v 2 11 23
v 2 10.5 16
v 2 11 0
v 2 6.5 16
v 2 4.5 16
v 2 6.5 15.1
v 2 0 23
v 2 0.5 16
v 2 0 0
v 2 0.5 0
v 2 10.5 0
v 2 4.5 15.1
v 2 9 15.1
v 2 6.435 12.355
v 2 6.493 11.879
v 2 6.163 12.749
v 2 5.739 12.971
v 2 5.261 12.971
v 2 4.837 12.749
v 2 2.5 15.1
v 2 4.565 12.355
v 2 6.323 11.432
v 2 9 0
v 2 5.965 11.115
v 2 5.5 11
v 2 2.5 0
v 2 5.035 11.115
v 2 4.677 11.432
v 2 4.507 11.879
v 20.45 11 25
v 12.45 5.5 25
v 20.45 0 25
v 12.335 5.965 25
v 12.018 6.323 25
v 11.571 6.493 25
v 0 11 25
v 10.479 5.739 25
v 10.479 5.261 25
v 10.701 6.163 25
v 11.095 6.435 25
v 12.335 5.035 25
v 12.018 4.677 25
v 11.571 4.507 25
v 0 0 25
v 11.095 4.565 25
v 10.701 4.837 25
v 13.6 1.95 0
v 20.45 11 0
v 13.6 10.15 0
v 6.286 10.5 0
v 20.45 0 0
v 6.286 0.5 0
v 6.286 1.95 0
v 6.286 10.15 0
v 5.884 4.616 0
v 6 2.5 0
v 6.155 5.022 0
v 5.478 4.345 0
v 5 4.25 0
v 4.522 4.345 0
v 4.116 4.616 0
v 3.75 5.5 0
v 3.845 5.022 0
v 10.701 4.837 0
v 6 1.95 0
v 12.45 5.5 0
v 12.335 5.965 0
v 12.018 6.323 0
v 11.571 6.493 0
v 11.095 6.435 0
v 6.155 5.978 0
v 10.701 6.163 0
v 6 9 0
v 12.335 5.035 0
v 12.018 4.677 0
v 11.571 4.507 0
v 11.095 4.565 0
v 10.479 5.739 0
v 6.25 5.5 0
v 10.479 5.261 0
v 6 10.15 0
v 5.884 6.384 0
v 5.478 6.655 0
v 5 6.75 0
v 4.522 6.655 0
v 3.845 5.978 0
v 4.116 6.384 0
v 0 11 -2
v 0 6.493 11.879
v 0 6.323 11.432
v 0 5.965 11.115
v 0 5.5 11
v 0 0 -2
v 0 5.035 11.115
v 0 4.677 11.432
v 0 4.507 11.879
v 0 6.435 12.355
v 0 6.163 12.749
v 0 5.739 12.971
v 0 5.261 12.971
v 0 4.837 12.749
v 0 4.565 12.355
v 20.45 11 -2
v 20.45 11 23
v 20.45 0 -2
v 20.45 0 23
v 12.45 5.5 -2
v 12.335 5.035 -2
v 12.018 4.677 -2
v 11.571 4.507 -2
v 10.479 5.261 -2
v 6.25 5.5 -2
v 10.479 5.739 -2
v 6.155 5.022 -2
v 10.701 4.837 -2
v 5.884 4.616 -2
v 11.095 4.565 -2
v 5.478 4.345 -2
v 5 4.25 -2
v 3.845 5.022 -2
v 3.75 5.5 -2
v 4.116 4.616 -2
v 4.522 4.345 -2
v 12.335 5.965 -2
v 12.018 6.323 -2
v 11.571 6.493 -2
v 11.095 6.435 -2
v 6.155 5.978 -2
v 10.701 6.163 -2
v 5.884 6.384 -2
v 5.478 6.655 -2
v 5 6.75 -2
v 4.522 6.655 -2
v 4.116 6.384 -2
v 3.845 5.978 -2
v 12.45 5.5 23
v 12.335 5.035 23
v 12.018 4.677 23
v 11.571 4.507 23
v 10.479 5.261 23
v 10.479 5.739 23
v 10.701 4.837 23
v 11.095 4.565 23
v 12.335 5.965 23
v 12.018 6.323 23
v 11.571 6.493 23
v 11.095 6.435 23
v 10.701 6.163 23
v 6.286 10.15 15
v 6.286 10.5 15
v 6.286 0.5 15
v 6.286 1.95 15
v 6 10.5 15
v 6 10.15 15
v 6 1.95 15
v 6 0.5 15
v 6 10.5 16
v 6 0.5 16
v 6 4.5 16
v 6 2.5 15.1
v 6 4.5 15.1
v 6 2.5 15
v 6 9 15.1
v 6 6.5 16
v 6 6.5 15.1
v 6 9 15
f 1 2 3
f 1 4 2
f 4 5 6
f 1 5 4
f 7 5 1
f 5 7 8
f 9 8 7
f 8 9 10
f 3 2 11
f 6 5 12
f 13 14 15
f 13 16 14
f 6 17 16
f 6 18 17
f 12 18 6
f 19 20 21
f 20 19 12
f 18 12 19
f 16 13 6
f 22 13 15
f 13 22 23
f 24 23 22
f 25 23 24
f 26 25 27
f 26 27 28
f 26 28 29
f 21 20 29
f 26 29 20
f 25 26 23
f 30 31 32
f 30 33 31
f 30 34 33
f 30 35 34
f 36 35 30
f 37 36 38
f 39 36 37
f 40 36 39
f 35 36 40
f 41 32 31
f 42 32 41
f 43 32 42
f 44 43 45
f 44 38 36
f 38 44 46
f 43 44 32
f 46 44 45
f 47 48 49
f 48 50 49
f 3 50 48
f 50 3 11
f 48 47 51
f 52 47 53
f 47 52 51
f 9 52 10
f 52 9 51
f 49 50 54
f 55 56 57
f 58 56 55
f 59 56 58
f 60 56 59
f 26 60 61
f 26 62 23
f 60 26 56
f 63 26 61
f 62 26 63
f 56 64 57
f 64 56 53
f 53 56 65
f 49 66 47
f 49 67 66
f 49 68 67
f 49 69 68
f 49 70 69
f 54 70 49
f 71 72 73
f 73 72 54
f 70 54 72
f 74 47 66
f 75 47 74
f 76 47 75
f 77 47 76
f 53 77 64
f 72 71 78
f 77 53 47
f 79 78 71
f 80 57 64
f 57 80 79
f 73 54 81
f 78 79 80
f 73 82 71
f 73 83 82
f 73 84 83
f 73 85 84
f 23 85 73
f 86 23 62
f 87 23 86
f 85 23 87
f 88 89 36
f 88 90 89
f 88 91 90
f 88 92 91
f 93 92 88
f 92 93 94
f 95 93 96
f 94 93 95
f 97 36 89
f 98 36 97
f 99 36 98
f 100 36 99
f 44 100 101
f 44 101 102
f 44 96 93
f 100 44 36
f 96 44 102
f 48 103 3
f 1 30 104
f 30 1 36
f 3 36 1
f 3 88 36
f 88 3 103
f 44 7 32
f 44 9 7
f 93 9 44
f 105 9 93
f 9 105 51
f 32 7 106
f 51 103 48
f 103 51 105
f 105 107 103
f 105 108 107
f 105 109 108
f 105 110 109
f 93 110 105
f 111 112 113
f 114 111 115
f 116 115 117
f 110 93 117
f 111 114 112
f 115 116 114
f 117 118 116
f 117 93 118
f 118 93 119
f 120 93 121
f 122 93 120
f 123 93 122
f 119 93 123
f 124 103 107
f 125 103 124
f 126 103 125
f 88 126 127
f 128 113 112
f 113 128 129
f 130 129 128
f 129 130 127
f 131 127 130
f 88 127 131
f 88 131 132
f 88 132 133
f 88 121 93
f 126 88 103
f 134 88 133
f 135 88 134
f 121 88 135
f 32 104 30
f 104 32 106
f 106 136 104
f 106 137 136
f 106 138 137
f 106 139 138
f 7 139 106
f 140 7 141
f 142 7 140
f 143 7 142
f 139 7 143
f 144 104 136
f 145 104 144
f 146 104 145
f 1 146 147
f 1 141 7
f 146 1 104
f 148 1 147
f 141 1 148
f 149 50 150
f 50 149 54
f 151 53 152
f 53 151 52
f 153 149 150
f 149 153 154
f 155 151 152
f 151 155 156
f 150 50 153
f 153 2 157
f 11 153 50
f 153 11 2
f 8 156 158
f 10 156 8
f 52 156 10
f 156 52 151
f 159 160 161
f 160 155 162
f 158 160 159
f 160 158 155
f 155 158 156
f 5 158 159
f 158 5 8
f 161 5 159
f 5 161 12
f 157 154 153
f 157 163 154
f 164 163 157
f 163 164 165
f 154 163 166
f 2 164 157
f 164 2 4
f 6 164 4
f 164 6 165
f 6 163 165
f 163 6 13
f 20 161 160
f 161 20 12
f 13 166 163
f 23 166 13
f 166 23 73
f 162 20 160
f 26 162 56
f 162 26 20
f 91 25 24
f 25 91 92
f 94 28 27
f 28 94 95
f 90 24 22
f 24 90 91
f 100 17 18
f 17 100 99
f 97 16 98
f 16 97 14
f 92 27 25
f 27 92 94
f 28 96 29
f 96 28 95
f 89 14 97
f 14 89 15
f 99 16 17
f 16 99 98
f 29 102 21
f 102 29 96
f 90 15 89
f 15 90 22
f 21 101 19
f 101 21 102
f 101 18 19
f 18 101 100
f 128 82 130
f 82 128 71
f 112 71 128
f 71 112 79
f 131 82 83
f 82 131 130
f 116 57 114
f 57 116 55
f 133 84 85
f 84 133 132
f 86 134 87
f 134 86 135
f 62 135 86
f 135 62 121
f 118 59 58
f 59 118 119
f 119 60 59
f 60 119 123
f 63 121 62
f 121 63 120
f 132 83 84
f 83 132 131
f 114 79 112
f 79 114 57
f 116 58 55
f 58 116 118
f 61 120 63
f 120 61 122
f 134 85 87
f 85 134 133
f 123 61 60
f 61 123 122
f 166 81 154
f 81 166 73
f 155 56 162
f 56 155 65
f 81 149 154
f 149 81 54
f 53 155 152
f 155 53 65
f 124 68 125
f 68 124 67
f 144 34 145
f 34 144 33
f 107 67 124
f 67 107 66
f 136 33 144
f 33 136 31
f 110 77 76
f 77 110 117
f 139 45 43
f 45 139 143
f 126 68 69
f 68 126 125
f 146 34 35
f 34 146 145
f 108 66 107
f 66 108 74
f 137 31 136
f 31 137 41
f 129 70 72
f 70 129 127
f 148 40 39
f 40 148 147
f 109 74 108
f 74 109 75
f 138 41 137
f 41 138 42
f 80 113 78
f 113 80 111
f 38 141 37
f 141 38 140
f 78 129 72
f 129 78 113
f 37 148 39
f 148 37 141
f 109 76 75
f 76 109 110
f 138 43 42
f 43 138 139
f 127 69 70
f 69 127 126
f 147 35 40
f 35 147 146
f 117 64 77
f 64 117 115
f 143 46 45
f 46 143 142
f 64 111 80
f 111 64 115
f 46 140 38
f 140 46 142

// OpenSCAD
// Dubs "A" class locomotive
//Measurements 1:64 scale in mm
$fs=0.5;
clearance=0.5; //why?
lengthBetweenBuffers=74;
trackGauge=16.5;
frameThickness=1.5;
frameSideHeight=10;
axleDiameter=2.0;
frameOutsideSpacing=14;
frameInsideSpacing=frameOutsideSpacing-frameThickness*2;
echo("frame inside spacing is ",frameInsideSpacing);

bufferPlateHeight=5;
bufferPlateLength=31;

frontAxleFromFrontDistance=20;
rearAxleFromFrontDistance=47;
axleHeight=axleDiameter;
boilerCentreHeight=19;

motorLength= 15;
motorDiameter=6;
motorShaftLength=6;
motorShaftDiameter=2.0;


oringInsideDiameter=7.5;//9.5;

oringThickness=1.7;//oringOutsideDiameter-oringInsideDiameter;
oringOutsideDiameter=oringInsideDiameter+oringThickness*2;
echo("o ring OD",oringOutsideDiameter," ID is",oringInsideDiameter);

pulleyThickness=3.5;
pulleyDiameter=oringInsideDiameter+oringThickness/2*2;
echo("pulley diameter is ",pulleyDiameter);


frictionWheelDiameter=oringOutsideDiameter;
frictionWheelThickness=pulleyThickness;
frictionWheelX=frictionWheelDiameter/2+motorShaftDiameter/2;
echo("friction wheel X position is ",frictionWheelX);


driveShaftDiameter=2.0;


wormGearLength=8;
wormGearDiameter=4.6;

gearDiameter=12;
gearThickness=2;



motorMountThickness=2;
motorMountLength=motorLength+motorShaftLength+motorMountThickness+2;
frameIntersection=9;
motorMountDepth=frameInsideSpacing;
driveShaftLength=motorMountLength+motorMountThickness+1;

wheelRimOutsideDiameter=12;
wheelRimInsideDiameter=10;
wheelFlangeDiameter=15;
wheelNumberSpokes=14;
wheelSpokeThickness=0.8;
wheelTreadThickness=3;
wheelFlangeThickness=1;
wheelHubDiameter=5;
wheelThickness=wheelTreadThickness+wheelFlangeThickness;

frontWheelPosition=[frontAxleFromFrontDistance,0,axleHeight];
rearWheelPosition=[rearAxleFromFrontDistance,0,axleHeight];

boilerLength=55;
boilerDiameter=15;
boilerDistance=5;
basePlateThickness=1;
basePlateLength=lengthBetweenBuffers;
basePlateWidth=31;

module gear() {
    color("white") cylinder(h=gearThickness,d=gearDiameter,center=true);
}

module axle() {
    rotate ([90,0,0])  cylinder(h=60,d=axleDiameter,center=true);
}

module spokes() {
    difference() {
        union() {
    rotate([0,0,0-22.5]) cube([wheelRimInsideDiameter,wheelSpokeThickness,wheelTreadThickness] ,center=true);
    rotate([0,0,45-22.5]) cube([wheelRimInsideDiameter,wheelSpokeThickness,wheelTreadThickness] ,center=true);
    //balances
     for (i=[90:10:135]) { 
        rotate([0,0,i-22.5]) cube([wheelRimInsideDiameter,wheelSpokeThickness,wheelTreadThickness] ,center=true);
        }
    }
    union() {
    //pin hole
    translate([0,wheelRimOutsideDiameter/4,0]) cylinder(h=wheelTreadThickness+0.1,d=1.5 ,center=true);
        //axle hole
                cylinder(h=wheelTreadThickness+0.1 ,d=2 ,center=true);
    
        
    }
}
}

//!spokes();

module wheelRim() {
  difference() {
        cylinder(h=wheelTreadThickness,d=wheelRimOutsideDiameter,center=true );  
      cylinder(h=wheelTreadThickness+0.1,d=wheelRimInsideDiameter,center=true ); 
  }
}

//!wheelRim();

module wheelFlange() {
     difference() {
         cylinder(h=wheelFlangeThickness,d=wheelFlangeDiameter,center=true);
        cylinder(h=wheelTreadThickness+0.1,d=wheelRimInsideDiameter,center=true ); 
     }
}

module wheelHub() {
      difference() {
        cylinder(h=wheelTreadThickness,d=wheelHubDiameter,center=true);
        cylinder(h=wheelTreadThickness+0.1 ,d=2 ,center=true);
    }
}



module wheel() {
    translate([0,0,wheelTreadThickness/2]) wheelRim();
    translate([0,0,wheelFlangeThickness/2]) wheelFlange();
   translate([0,0,wheelTreadThickness/2]) spokes();
     translate([0,0,wheelTreadThickness/2])  wheelHub();
}

//!wheel();



module oring() { 
    color("black") 
    rotate_extrude()
translate([(oringOutsideDiameter-(oringOutsideDiameter-oringInsideDiameter)/2)/2, 0, 0])
circle(d = oringThickness); 
}

//!oring();

module pulley() {
      difference() {
          cylinder(h=pulleyThickness,d=pulleyDiameter); 
         union() {
             //groove
             translate([0,0,pulleyThickness/2]) oring();
             driveShaft();
         }
}
}

//!pulley();


    
module frictionWheel() {
    pulley();
    translate([0,0,pulleyThickness/2])  oring();
}

module wheelAssembly() {
   
            translate([0,-frameOutsideSpacing/2,0])  rotate([90,90,0]) wheel();
            translate([0,(frameOutsideSpacing)/2,0]) rotate([90,90,180])   wheel();
            rotate([90,90,0]) gear();
}

module motor() {
    color("red") cylinder(h=motorLength,d=motorDiameter);
    translate([0,0,motorLength/2+motorShaftLength]) cylinder(h=motorShaftLength,d=motorShaftDiameter);
}

module driveShaft() {
     cylinder(h=driveShaftLength,d=driveShaftDiameter);
}

module wormGear() {
    color("white")  cylinder(h=wormGearLength,d=wormGearDiameter);
}

module motorMount() {
       color("yellow") 
    difference() {
           union() {
    //top
    cube([motorMountThickness,motorMountDepth,motorMountLength]);
    //worm end
    translate([0,0,-motorMountThickness]) cube([frictionWheelX+motorDiameter/2+driveShaftDiameter+frameIntersection,motorMountDepth,motorMountThickness]);
    //friction Wheel end
    translate([0,0,motorMountLength-motorMountThickness]) cube([frictionWheelX+motorDiameter/2+driveShaftDiameter+frameIntersection,motorMountDepth,motorMountThickness]);
    //motor housing
    motorMountMotorHousingDepth=motorDiameter+motorMountThickness*2;
    translate([motorMountThickness,motorMountDepth/2-motorMountMotorHousingDepth/2,0]) cube([motorDiameter/1.4,motorMountMotorHousingDepth,motorLength]);
     //motor housing stops
               translate([0,motorDiameter/2-motorMountThickness-0.5,motorLength]) cube([motorDiameter,motorMountThickness+motorDiameter/3,1]);
                              translate([0,motorMountDepth-motorDiameter/2-motorMountThickness+0.5,motorLength]) cube([motorDiameter,motorMountThickness+motorDiameter/3,1]);
           }
           union() {
              //space for motor body
               translate([motorMountThickness,motorMountDepth/2-motorDiameter/2,0]) cube([motorDiameter+clearance,motorDiameter+clearance,motorLength+0.1]);
               //hole for pressure screww
            translate([-motorMountThickness/2,motorMountDepth/2,motorLength-3]) rotate([0,90,0])  cylinder(h=motorMountThickness+3,d=2.0);
               //hole for motor wires
    translate([motorDiameter-motorMountThickness/2,motorMountDepth/2,-5]) cylinder(h=motorLength,d=2.5);
               //space for inserting motor
               translate([motorDiameter,(motorDiameter-2.1)/2,0]) cube([motorDiameter+1.6,motorDiameter+2.2,motorLength]);
               //drive shaft
                             translate([frictionWheelX+motorDiameter/2+motorMountThickness,motorMountDepth/2,-2]) driveShaft(); 
           }
    }
}

!motorMount();

module motorAssembly() {
   difference() {
       union() {
           translate([frictionWheelX,0,motorLength+motorShaftLength/2-frictionWheelThickness/2]) frictionWheel();

    translate([frictionWheelX,0,wormGearLength/2]) wormGear();
    translate([-motorDiameter/2-motorMountThickness,-motorMountDepth/2,0]) motorMount();
    motor();
       }
       union() {

       }
   }
}

//!motorAssembly();

module frameSideBlock() {
    union() {
        cube([lengthBetweenBuffers,frameThickness,frameSideHeight]);
    }
}

module frameCutout() {
    intersection() {
        translate([frameSideHeight/2,frameThickness-0.1,0]) rotate([90,0,0]) cylinder(h=frameThickness*2+0.2,d=frameSideHeight);
        translate([frameSideHeight/2,-frameThickness-0.1,0]) cube([frameSideHeight/2,frameThickness*2+0.2,frameSideHeight/2]);  
    }
            translate([-4,-frameThickness-0.1,0]) cube([frameSideHeight,frameThickness*2+0.2,frameSideHeight/2]); 
}

frameCutoutLength=frameSideHeight;

//!frameCutout();



module frameSide() {
    difference() {
        union() {
    frameSideBlock();
        
        }
    union() {
    translate([frontAxleFromFrontDistance+frameCutoutLength+axleDiameter,0,0]) rotate([0,0,180]) frameCutout();
            translate([rearAxleFromFrontDistance-frameCutoutLength-axleDiameter,0.2,0])  frameCutout();
                   translate([rearAxleFromFrontDistance+frameCutoutLength+axleDiameter,0,0])  rotate([0,0,180]) frameCutout();
                    translate([rearAxleFromFrontDistance+frameCutoutLength*2+axleDiameter,0,0])   frameCutout();
    }
    }
}


module bufferPlate() {
      translate([0,0,frameSideHeight-bufferPlateHeight/2-frameThickness]) rotate([0,90,0]) {
          radius=2;
    x=bufferPlateHeight;
    y=bufferPlateLength;
    z=frameThickness;
    linear_extrude(height=z)
hull()
{

    // place 4 circles in the corners, with the given radius
    translate([(-x/2)+(radius/2), (-y/2)+(radius/2), 0])
    circle(r=radius);

    translate([(x/2)-(radius/2), (-y/2)+(radius/2), 0])
    circle(r=radius);

    translate([(-x/2)+(radius/2), (y/2)-(radius/2), 0])
    circle(r=radius);

    translate([(x/2)-(radius/2), (y/2)-(radius/2), 0])
    circle(r=radius);
}

}
}

module frame() {
    difference() {
        union() {
                translate([0,frameInsideSpacing/2,0]) frameSide();
            translate([0,-frameOutsideSpacing/2,0]) frameSide();
    bufferPlate();
                    translate([lengthBetweenBuffers,0,0]) bufferPlate();
        }
        union() {
            translate(frontWheelPosition) axle();
            translate(rearWheelPosition) axle();

        }}
        
}

!frame();

module boiler() {
    rotate([0,90,0]) cylinder(h=boilerLength,d=boilerDiameter);
}

module basePlate() {
    cube([lengthBetweenBuffers,bufferPlateLength,basePlateThickness]);
}

module superstructure() {
    translate([boilerDistance,0,boilerDiameter/2+frameSideHeight+basePlateThickness]) boiler();
    translate([0,-basePlateWidth/2,frameSideHeight]) basePlate();
}

module loco() {

            frame();
            translate(frontWheelPosition) wheelAssembly();
            translate(rearWheelPosition) wheelAssembly();
            translate([8,0,+12]) translate(rearWheelPosition) rotate([0,90,180])  motorAssembly();
            *superstructure();
                      
 
  
}
    
    loco();
